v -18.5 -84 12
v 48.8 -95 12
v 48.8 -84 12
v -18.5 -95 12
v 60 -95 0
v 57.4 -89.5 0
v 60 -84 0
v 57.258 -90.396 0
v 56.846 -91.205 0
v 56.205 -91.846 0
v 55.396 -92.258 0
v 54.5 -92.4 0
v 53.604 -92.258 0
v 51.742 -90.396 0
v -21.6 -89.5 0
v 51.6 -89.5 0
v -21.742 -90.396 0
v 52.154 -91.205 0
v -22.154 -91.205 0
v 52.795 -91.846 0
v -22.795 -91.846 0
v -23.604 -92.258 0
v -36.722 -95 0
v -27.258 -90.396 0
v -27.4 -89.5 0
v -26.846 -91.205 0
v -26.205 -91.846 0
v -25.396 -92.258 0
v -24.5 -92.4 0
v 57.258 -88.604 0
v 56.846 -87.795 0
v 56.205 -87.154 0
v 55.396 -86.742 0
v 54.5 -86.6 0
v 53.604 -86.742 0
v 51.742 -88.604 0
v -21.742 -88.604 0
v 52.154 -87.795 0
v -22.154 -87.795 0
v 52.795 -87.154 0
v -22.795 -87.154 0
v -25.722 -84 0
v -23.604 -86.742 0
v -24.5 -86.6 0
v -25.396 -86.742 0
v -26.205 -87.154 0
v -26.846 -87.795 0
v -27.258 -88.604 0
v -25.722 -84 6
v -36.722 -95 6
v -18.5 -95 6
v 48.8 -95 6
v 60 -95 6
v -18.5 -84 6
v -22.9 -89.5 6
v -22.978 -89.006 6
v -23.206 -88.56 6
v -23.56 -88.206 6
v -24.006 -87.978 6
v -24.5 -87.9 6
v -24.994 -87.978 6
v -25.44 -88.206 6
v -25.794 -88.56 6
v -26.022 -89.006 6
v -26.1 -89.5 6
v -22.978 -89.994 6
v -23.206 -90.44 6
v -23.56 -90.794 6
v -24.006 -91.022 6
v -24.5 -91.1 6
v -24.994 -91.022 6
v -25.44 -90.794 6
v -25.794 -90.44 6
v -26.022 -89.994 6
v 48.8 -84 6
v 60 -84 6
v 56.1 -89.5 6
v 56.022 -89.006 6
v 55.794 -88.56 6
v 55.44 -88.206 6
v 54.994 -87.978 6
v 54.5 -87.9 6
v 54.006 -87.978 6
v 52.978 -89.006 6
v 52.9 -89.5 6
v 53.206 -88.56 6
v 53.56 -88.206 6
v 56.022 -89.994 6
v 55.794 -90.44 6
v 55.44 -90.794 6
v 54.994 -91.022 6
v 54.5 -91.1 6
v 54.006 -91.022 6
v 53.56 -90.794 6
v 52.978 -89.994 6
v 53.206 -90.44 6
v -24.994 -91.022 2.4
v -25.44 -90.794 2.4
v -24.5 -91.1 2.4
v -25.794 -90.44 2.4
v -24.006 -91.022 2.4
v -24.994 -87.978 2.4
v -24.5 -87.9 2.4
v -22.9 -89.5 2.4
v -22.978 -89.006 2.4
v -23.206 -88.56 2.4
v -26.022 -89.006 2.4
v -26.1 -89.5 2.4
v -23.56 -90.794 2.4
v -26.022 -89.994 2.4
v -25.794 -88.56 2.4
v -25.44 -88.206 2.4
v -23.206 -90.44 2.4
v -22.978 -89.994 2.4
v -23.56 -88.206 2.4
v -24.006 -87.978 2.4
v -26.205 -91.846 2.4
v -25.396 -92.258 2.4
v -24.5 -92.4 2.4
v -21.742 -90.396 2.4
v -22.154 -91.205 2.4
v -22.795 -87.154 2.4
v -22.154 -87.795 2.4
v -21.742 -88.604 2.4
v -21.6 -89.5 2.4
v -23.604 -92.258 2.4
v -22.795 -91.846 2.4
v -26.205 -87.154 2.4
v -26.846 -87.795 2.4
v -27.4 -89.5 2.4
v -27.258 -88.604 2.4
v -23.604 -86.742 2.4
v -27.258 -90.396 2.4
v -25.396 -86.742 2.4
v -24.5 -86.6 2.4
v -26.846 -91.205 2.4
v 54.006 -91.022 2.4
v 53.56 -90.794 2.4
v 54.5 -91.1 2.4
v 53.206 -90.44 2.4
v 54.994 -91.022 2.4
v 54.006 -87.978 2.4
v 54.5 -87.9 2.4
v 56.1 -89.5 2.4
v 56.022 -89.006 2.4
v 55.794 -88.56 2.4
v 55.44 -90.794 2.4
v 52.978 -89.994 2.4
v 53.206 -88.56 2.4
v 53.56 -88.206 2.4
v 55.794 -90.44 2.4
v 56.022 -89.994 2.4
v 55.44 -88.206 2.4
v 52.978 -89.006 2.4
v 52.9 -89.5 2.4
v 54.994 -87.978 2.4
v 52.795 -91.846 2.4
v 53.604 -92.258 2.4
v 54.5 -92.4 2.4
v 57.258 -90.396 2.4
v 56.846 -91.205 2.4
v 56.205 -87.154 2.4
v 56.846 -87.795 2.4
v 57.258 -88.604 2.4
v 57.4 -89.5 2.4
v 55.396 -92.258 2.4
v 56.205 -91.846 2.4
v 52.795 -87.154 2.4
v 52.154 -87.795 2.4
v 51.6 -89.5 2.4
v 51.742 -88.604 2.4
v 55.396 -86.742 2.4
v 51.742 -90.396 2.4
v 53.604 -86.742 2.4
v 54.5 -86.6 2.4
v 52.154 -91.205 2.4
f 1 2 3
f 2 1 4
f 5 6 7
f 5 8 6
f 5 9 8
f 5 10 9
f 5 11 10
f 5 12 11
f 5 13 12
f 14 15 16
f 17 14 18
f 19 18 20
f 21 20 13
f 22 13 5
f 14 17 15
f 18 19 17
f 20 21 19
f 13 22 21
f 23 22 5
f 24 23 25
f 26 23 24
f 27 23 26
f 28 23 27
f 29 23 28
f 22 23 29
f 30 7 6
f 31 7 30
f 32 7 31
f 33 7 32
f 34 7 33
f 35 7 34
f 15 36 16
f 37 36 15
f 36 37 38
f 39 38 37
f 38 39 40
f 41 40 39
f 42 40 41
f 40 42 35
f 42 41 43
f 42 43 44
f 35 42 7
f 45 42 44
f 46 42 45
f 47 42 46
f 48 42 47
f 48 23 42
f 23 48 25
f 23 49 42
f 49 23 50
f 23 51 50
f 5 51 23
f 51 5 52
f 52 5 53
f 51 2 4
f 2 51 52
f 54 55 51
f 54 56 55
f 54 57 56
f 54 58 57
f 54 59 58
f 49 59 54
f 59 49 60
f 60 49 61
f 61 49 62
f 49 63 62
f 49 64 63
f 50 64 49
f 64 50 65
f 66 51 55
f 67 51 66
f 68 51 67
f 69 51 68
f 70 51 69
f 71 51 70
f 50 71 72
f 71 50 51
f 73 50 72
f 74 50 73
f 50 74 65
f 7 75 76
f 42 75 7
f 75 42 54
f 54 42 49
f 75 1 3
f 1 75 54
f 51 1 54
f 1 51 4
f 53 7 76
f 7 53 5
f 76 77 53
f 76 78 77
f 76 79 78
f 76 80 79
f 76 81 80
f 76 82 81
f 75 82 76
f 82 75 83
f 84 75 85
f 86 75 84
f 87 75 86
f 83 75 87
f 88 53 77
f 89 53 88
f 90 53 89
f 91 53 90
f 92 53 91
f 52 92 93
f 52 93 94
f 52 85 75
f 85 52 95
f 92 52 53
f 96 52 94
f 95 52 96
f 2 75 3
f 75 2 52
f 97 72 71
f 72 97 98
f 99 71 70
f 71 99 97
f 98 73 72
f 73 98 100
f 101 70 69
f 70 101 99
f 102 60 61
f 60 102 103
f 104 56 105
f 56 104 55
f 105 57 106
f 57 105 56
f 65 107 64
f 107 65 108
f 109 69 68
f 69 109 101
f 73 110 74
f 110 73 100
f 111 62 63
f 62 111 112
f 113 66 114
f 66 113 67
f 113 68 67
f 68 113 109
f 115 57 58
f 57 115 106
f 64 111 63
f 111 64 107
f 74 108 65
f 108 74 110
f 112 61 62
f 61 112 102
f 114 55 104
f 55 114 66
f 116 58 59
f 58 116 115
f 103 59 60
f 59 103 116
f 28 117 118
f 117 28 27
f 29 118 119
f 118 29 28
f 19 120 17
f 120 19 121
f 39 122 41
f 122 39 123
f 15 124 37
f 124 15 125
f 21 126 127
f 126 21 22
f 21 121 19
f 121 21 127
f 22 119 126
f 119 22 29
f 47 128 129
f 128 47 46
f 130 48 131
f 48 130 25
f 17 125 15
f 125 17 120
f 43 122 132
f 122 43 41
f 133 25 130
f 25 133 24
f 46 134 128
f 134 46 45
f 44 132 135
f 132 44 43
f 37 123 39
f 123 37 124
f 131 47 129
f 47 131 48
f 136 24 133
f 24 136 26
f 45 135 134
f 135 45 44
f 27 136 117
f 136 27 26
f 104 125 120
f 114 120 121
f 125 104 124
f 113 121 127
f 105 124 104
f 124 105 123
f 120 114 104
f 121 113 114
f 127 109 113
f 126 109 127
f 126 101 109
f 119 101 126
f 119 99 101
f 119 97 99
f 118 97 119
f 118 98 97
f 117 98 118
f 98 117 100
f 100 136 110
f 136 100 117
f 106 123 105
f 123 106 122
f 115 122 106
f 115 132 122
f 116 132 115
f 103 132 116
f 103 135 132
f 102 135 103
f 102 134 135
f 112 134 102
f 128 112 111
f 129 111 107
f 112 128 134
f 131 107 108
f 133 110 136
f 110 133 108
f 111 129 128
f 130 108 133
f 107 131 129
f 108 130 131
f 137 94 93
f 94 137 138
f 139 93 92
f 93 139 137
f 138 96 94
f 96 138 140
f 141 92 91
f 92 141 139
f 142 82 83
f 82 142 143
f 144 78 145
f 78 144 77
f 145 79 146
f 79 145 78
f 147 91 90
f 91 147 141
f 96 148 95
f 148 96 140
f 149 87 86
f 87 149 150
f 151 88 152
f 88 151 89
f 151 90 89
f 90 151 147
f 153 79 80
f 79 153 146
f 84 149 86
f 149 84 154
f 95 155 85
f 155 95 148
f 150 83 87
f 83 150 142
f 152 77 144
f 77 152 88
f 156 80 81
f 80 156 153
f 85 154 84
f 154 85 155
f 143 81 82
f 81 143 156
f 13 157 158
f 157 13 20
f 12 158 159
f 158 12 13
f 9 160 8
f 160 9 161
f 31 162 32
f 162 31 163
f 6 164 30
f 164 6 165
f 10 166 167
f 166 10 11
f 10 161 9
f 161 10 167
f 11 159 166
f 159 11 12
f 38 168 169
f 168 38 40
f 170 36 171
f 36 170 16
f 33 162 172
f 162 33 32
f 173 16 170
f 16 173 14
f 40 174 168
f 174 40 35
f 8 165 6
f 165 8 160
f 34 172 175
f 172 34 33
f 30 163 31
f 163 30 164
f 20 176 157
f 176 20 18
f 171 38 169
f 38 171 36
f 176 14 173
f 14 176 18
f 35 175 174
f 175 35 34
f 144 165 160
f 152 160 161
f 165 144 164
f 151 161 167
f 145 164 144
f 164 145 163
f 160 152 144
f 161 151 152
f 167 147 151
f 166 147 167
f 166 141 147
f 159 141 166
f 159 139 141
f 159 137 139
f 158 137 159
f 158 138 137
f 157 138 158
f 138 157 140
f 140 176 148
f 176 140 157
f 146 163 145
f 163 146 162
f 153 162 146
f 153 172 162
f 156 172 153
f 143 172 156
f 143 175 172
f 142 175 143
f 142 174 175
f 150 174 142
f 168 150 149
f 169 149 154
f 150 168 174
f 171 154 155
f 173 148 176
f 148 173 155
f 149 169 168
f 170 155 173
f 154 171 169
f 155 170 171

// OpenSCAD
use <bed_carriage.scad>

height = 12;
translate([60,10, height]) rotate([0,180,90]) edge_arm();
